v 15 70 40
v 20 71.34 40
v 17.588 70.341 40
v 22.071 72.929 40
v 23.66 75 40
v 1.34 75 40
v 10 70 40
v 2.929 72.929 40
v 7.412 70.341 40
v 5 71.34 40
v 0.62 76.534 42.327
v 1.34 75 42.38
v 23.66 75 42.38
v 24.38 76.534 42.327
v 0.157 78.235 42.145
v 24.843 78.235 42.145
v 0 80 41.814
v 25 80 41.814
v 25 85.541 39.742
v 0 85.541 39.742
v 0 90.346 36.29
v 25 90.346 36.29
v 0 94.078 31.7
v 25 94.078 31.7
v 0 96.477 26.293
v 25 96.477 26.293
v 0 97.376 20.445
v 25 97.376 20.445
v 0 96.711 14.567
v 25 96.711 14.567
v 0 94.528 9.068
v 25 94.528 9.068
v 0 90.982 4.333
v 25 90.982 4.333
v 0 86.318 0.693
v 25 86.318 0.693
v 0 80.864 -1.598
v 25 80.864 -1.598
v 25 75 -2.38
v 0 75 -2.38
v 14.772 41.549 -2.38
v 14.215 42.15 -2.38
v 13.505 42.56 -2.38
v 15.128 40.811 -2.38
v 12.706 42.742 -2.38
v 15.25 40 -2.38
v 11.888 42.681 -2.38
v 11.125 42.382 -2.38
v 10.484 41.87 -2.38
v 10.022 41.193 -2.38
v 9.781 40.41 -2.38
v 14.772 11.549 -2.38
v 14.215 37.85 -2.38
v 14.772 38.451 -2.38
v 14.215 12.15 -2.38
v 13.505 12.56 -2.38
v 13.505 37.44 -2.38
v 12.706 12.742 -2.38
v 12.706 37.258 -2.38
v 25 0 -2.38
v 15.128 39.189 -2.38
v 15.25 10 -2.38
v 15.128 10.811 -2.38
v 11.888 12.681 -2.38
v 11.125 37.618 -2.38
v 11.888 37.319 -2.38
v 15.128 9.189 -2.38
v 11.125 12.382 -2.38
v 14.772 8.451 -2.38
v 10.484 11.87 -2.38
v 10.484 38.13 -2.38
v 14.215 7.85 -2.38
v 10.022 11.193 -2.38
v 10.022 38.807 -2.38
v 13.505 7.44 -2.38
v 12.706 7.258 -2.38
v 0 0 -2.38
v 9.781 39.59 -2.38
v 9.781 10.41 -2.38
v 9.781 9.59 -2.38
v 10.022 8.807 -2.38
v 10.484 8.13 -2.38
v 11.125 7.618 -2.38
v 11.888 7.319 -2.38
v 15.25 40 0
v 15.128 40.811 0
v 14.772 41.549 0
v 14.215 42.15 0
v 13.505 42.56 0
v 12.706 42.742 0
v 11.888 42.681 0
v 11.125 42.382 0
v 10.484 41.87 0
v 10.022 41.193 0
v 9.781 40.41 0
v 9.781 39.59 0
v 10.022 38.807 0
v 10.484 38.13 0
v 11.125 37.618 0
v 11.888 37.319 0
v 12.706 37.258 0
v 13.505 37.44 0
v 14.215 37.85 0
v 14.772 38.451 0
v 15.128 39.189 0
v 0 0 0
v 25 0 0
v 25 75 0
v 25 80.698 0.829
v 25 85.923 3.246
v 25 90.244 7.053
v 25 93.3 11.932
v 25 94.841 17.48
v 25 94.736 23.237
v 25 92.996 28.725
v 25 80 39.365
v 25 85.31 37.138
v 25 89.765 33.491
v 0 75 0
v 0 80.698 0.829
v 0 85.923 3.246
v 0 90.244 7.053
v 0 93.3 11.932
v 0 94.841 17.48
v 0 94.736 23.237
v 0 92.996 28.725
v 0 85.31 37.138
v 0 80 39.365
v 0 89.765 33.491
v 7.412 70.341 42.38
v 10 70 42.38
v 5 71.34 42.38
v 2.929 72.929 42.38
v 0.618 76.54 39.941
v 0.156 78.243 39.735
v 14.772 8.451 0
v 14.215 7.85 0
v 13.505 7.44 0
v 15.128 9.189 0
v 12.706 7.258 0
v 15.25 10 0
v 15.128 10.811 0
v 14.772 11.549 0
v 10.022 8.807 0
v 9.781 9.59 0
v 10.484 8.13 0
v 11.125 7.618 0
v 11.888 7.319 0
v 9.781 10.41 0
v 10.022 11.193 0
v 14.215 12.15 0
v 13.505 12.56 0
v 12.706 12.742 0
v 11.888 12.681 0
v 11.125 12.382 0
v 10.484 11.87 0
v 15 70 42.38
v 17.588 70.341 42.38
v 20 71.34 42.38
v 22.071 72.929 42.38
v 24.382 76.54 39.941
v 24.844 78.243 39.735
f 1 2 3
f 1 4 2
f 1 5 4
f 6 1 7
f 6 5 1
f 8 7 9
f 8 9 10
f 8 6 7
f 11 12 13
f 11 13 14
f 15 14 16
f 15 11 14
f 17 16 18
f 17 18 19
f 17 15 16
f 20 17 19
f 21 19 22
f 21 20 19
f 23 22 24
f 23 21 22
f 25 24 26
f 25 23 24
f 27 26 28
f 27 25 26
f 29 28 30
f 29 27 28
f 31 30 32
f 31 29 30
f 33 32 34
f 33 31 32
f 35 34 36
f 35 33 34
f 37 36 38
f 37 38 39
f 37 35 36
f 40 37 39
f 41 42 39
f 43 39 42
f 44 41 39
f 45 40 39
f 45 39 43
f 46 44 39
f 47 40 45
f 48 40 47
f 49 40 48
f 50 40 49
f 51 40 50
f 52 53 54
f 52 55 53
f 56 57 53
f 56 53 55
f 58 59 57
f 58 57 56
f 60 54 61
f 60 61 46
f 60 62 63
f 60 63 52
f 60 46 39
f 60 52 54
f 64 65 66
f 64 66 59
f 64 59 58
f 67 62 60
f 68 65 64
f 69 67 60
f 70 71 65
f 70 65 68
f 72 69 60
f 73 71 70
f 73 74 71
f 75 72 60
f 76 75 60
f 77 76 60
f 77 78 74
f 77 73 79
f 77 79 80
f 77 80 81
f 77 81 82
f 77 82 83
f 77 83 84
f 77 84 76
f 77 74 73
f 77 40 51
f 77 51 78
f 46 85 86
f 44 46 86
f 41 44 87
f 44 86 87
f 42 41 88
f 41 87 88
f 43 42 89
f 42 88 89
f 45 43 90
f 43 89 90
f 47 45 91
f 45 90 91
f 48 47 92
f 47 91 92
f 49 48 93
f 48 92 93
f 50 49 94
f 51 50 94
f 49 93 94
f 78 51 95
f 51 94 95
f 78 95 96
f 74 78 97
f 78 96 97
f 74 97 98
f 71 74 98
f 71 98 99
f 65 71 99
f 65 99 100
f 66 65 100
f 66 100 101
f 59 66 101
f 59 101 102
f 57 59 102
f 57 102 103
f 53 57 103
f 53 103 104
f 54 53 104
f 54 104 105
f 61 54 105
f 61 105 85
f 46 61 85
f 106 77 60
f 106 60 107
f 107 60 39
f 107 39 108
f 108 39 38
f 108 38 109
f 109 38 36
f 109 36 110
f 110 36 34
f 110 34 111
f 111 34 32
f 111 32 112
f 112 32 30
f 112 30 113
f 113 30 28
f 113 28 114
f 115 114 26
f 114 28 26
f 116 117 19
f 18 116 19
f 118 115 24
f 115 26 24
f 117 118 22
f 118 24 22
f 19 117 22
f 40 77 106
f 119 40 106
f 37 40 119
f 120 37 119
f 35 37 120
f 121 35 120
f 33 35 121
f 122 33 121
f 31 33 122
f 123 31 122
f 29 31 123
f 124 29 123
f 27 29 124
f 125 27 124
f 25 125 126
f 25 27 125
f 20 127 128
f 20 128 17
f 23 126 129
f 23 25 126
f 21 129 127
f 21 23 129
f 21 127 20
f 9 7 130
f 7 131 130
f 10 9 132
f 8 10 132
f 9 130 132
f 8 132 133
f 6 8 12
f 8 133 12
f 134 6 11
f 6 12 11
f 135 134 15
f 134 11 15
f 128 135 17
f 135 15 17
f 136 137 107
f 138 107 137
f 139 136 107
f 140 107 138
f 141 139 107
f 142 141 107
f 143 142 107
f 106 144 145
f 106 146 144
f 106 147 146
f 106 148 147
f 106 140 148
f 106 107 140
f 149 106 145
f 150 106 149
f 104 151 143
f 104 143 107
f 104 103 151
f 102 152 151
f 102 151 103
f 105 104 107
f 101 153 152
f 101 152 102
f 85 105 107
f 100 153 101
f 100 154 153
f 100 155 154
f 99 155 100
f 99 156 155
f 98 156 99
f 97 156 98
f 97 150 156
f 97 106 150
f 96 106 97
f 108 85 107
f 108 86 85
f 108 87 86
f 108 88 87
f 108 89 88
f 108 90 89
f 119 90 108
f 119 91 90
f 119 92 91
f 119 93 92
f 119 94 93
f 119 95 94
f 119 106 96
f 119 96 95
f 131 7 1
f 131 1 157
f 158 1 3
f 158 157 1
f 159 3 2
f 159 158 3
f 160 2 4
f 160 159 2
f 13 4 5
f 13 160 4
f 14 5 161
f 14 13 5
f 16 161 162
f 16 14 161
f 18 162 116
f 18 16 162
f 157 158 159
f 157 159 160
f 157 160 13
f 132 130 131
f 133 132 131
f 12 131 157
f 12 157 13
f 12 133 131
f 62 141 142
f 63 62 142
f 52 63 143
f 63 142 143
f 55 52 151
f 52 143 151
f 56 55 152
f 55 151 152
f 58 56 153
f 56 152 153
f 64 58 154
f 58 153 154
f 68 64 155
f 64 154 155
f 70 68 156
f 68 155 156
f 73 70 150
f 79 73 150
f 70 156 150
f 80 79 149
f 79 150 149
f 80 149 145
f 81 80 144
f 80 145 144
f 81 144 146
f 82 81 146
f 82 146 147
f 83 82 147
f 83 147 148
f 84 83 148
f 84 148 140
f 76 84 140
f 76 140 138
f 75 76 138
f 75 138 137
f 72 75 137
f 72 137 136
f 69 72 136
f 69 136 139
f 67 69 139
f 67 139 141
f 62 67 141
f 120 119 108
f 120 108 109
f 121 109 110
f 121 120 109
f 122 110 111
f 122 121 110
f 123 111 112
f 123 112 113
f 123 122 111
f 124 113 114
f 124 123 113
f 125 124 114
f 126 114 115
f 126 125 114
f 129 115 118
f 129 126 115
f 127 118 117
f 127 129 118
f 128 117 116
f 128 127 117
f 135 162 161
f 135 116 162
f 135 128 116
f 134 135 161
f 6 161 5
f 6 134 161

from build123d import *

# Parameters (mm, degrees)
BOSS_EXTRUDE1_DEPTH = 25
FILLET1_R           = 10
SKETCH2_R           = 2.75
CUT_EXTRUDE1_DEPTH  = 25


with BuildPart() as part:
    # Sketch1 → Boss-Extrude1 (new body)
    with BuildSketch(Plane(origin=(0, 0, 0), x_dir=(0, 0, -1), z_dir=(1, 0, 0))):
        with BuildLine():
            Line((0, 0), (0, 75))
            ThreePointArc((0, 75), (-20, 95), (-40, 75))
            Line((-40, 75), (-40, 70))
            Line((-40, 70), (-42.38, 70))
            Line((-42.38, 70), (-42.38, 75))
            ThreePointArc((-42.38, 75), (-20, 97.38), (2.38, 75))
            Line((2.38, 75), (2.38, 0))
            Line((2.38, 0), (0, 0))
        make_face()
    extrude(amount=BOSS_EXTRUDE1_DEPTH)

    # Fillet1
    fillet1_edges = [part.edges().sort_by_distance(p)[0] for p in [
        (0, 70, 41.19),
        (25, 70, 41.19),
    ]]
    fillet(fillet1_edges, radius=FILLET1_R)

    # Sketch2 → Cut-Extrude1 (cut)
    with BuildSketch(Plane.XY):
        with Locations((12.5, 10)):
            Circle(SKETCH2_R)
        with Locations((12.5, 40)):
            Circle(SKETCH2_R)
    extrude(amount=-CUT_EXTRUDE1_DEPTH, mode=Mode.SUBTRACT)


solid = part.part
